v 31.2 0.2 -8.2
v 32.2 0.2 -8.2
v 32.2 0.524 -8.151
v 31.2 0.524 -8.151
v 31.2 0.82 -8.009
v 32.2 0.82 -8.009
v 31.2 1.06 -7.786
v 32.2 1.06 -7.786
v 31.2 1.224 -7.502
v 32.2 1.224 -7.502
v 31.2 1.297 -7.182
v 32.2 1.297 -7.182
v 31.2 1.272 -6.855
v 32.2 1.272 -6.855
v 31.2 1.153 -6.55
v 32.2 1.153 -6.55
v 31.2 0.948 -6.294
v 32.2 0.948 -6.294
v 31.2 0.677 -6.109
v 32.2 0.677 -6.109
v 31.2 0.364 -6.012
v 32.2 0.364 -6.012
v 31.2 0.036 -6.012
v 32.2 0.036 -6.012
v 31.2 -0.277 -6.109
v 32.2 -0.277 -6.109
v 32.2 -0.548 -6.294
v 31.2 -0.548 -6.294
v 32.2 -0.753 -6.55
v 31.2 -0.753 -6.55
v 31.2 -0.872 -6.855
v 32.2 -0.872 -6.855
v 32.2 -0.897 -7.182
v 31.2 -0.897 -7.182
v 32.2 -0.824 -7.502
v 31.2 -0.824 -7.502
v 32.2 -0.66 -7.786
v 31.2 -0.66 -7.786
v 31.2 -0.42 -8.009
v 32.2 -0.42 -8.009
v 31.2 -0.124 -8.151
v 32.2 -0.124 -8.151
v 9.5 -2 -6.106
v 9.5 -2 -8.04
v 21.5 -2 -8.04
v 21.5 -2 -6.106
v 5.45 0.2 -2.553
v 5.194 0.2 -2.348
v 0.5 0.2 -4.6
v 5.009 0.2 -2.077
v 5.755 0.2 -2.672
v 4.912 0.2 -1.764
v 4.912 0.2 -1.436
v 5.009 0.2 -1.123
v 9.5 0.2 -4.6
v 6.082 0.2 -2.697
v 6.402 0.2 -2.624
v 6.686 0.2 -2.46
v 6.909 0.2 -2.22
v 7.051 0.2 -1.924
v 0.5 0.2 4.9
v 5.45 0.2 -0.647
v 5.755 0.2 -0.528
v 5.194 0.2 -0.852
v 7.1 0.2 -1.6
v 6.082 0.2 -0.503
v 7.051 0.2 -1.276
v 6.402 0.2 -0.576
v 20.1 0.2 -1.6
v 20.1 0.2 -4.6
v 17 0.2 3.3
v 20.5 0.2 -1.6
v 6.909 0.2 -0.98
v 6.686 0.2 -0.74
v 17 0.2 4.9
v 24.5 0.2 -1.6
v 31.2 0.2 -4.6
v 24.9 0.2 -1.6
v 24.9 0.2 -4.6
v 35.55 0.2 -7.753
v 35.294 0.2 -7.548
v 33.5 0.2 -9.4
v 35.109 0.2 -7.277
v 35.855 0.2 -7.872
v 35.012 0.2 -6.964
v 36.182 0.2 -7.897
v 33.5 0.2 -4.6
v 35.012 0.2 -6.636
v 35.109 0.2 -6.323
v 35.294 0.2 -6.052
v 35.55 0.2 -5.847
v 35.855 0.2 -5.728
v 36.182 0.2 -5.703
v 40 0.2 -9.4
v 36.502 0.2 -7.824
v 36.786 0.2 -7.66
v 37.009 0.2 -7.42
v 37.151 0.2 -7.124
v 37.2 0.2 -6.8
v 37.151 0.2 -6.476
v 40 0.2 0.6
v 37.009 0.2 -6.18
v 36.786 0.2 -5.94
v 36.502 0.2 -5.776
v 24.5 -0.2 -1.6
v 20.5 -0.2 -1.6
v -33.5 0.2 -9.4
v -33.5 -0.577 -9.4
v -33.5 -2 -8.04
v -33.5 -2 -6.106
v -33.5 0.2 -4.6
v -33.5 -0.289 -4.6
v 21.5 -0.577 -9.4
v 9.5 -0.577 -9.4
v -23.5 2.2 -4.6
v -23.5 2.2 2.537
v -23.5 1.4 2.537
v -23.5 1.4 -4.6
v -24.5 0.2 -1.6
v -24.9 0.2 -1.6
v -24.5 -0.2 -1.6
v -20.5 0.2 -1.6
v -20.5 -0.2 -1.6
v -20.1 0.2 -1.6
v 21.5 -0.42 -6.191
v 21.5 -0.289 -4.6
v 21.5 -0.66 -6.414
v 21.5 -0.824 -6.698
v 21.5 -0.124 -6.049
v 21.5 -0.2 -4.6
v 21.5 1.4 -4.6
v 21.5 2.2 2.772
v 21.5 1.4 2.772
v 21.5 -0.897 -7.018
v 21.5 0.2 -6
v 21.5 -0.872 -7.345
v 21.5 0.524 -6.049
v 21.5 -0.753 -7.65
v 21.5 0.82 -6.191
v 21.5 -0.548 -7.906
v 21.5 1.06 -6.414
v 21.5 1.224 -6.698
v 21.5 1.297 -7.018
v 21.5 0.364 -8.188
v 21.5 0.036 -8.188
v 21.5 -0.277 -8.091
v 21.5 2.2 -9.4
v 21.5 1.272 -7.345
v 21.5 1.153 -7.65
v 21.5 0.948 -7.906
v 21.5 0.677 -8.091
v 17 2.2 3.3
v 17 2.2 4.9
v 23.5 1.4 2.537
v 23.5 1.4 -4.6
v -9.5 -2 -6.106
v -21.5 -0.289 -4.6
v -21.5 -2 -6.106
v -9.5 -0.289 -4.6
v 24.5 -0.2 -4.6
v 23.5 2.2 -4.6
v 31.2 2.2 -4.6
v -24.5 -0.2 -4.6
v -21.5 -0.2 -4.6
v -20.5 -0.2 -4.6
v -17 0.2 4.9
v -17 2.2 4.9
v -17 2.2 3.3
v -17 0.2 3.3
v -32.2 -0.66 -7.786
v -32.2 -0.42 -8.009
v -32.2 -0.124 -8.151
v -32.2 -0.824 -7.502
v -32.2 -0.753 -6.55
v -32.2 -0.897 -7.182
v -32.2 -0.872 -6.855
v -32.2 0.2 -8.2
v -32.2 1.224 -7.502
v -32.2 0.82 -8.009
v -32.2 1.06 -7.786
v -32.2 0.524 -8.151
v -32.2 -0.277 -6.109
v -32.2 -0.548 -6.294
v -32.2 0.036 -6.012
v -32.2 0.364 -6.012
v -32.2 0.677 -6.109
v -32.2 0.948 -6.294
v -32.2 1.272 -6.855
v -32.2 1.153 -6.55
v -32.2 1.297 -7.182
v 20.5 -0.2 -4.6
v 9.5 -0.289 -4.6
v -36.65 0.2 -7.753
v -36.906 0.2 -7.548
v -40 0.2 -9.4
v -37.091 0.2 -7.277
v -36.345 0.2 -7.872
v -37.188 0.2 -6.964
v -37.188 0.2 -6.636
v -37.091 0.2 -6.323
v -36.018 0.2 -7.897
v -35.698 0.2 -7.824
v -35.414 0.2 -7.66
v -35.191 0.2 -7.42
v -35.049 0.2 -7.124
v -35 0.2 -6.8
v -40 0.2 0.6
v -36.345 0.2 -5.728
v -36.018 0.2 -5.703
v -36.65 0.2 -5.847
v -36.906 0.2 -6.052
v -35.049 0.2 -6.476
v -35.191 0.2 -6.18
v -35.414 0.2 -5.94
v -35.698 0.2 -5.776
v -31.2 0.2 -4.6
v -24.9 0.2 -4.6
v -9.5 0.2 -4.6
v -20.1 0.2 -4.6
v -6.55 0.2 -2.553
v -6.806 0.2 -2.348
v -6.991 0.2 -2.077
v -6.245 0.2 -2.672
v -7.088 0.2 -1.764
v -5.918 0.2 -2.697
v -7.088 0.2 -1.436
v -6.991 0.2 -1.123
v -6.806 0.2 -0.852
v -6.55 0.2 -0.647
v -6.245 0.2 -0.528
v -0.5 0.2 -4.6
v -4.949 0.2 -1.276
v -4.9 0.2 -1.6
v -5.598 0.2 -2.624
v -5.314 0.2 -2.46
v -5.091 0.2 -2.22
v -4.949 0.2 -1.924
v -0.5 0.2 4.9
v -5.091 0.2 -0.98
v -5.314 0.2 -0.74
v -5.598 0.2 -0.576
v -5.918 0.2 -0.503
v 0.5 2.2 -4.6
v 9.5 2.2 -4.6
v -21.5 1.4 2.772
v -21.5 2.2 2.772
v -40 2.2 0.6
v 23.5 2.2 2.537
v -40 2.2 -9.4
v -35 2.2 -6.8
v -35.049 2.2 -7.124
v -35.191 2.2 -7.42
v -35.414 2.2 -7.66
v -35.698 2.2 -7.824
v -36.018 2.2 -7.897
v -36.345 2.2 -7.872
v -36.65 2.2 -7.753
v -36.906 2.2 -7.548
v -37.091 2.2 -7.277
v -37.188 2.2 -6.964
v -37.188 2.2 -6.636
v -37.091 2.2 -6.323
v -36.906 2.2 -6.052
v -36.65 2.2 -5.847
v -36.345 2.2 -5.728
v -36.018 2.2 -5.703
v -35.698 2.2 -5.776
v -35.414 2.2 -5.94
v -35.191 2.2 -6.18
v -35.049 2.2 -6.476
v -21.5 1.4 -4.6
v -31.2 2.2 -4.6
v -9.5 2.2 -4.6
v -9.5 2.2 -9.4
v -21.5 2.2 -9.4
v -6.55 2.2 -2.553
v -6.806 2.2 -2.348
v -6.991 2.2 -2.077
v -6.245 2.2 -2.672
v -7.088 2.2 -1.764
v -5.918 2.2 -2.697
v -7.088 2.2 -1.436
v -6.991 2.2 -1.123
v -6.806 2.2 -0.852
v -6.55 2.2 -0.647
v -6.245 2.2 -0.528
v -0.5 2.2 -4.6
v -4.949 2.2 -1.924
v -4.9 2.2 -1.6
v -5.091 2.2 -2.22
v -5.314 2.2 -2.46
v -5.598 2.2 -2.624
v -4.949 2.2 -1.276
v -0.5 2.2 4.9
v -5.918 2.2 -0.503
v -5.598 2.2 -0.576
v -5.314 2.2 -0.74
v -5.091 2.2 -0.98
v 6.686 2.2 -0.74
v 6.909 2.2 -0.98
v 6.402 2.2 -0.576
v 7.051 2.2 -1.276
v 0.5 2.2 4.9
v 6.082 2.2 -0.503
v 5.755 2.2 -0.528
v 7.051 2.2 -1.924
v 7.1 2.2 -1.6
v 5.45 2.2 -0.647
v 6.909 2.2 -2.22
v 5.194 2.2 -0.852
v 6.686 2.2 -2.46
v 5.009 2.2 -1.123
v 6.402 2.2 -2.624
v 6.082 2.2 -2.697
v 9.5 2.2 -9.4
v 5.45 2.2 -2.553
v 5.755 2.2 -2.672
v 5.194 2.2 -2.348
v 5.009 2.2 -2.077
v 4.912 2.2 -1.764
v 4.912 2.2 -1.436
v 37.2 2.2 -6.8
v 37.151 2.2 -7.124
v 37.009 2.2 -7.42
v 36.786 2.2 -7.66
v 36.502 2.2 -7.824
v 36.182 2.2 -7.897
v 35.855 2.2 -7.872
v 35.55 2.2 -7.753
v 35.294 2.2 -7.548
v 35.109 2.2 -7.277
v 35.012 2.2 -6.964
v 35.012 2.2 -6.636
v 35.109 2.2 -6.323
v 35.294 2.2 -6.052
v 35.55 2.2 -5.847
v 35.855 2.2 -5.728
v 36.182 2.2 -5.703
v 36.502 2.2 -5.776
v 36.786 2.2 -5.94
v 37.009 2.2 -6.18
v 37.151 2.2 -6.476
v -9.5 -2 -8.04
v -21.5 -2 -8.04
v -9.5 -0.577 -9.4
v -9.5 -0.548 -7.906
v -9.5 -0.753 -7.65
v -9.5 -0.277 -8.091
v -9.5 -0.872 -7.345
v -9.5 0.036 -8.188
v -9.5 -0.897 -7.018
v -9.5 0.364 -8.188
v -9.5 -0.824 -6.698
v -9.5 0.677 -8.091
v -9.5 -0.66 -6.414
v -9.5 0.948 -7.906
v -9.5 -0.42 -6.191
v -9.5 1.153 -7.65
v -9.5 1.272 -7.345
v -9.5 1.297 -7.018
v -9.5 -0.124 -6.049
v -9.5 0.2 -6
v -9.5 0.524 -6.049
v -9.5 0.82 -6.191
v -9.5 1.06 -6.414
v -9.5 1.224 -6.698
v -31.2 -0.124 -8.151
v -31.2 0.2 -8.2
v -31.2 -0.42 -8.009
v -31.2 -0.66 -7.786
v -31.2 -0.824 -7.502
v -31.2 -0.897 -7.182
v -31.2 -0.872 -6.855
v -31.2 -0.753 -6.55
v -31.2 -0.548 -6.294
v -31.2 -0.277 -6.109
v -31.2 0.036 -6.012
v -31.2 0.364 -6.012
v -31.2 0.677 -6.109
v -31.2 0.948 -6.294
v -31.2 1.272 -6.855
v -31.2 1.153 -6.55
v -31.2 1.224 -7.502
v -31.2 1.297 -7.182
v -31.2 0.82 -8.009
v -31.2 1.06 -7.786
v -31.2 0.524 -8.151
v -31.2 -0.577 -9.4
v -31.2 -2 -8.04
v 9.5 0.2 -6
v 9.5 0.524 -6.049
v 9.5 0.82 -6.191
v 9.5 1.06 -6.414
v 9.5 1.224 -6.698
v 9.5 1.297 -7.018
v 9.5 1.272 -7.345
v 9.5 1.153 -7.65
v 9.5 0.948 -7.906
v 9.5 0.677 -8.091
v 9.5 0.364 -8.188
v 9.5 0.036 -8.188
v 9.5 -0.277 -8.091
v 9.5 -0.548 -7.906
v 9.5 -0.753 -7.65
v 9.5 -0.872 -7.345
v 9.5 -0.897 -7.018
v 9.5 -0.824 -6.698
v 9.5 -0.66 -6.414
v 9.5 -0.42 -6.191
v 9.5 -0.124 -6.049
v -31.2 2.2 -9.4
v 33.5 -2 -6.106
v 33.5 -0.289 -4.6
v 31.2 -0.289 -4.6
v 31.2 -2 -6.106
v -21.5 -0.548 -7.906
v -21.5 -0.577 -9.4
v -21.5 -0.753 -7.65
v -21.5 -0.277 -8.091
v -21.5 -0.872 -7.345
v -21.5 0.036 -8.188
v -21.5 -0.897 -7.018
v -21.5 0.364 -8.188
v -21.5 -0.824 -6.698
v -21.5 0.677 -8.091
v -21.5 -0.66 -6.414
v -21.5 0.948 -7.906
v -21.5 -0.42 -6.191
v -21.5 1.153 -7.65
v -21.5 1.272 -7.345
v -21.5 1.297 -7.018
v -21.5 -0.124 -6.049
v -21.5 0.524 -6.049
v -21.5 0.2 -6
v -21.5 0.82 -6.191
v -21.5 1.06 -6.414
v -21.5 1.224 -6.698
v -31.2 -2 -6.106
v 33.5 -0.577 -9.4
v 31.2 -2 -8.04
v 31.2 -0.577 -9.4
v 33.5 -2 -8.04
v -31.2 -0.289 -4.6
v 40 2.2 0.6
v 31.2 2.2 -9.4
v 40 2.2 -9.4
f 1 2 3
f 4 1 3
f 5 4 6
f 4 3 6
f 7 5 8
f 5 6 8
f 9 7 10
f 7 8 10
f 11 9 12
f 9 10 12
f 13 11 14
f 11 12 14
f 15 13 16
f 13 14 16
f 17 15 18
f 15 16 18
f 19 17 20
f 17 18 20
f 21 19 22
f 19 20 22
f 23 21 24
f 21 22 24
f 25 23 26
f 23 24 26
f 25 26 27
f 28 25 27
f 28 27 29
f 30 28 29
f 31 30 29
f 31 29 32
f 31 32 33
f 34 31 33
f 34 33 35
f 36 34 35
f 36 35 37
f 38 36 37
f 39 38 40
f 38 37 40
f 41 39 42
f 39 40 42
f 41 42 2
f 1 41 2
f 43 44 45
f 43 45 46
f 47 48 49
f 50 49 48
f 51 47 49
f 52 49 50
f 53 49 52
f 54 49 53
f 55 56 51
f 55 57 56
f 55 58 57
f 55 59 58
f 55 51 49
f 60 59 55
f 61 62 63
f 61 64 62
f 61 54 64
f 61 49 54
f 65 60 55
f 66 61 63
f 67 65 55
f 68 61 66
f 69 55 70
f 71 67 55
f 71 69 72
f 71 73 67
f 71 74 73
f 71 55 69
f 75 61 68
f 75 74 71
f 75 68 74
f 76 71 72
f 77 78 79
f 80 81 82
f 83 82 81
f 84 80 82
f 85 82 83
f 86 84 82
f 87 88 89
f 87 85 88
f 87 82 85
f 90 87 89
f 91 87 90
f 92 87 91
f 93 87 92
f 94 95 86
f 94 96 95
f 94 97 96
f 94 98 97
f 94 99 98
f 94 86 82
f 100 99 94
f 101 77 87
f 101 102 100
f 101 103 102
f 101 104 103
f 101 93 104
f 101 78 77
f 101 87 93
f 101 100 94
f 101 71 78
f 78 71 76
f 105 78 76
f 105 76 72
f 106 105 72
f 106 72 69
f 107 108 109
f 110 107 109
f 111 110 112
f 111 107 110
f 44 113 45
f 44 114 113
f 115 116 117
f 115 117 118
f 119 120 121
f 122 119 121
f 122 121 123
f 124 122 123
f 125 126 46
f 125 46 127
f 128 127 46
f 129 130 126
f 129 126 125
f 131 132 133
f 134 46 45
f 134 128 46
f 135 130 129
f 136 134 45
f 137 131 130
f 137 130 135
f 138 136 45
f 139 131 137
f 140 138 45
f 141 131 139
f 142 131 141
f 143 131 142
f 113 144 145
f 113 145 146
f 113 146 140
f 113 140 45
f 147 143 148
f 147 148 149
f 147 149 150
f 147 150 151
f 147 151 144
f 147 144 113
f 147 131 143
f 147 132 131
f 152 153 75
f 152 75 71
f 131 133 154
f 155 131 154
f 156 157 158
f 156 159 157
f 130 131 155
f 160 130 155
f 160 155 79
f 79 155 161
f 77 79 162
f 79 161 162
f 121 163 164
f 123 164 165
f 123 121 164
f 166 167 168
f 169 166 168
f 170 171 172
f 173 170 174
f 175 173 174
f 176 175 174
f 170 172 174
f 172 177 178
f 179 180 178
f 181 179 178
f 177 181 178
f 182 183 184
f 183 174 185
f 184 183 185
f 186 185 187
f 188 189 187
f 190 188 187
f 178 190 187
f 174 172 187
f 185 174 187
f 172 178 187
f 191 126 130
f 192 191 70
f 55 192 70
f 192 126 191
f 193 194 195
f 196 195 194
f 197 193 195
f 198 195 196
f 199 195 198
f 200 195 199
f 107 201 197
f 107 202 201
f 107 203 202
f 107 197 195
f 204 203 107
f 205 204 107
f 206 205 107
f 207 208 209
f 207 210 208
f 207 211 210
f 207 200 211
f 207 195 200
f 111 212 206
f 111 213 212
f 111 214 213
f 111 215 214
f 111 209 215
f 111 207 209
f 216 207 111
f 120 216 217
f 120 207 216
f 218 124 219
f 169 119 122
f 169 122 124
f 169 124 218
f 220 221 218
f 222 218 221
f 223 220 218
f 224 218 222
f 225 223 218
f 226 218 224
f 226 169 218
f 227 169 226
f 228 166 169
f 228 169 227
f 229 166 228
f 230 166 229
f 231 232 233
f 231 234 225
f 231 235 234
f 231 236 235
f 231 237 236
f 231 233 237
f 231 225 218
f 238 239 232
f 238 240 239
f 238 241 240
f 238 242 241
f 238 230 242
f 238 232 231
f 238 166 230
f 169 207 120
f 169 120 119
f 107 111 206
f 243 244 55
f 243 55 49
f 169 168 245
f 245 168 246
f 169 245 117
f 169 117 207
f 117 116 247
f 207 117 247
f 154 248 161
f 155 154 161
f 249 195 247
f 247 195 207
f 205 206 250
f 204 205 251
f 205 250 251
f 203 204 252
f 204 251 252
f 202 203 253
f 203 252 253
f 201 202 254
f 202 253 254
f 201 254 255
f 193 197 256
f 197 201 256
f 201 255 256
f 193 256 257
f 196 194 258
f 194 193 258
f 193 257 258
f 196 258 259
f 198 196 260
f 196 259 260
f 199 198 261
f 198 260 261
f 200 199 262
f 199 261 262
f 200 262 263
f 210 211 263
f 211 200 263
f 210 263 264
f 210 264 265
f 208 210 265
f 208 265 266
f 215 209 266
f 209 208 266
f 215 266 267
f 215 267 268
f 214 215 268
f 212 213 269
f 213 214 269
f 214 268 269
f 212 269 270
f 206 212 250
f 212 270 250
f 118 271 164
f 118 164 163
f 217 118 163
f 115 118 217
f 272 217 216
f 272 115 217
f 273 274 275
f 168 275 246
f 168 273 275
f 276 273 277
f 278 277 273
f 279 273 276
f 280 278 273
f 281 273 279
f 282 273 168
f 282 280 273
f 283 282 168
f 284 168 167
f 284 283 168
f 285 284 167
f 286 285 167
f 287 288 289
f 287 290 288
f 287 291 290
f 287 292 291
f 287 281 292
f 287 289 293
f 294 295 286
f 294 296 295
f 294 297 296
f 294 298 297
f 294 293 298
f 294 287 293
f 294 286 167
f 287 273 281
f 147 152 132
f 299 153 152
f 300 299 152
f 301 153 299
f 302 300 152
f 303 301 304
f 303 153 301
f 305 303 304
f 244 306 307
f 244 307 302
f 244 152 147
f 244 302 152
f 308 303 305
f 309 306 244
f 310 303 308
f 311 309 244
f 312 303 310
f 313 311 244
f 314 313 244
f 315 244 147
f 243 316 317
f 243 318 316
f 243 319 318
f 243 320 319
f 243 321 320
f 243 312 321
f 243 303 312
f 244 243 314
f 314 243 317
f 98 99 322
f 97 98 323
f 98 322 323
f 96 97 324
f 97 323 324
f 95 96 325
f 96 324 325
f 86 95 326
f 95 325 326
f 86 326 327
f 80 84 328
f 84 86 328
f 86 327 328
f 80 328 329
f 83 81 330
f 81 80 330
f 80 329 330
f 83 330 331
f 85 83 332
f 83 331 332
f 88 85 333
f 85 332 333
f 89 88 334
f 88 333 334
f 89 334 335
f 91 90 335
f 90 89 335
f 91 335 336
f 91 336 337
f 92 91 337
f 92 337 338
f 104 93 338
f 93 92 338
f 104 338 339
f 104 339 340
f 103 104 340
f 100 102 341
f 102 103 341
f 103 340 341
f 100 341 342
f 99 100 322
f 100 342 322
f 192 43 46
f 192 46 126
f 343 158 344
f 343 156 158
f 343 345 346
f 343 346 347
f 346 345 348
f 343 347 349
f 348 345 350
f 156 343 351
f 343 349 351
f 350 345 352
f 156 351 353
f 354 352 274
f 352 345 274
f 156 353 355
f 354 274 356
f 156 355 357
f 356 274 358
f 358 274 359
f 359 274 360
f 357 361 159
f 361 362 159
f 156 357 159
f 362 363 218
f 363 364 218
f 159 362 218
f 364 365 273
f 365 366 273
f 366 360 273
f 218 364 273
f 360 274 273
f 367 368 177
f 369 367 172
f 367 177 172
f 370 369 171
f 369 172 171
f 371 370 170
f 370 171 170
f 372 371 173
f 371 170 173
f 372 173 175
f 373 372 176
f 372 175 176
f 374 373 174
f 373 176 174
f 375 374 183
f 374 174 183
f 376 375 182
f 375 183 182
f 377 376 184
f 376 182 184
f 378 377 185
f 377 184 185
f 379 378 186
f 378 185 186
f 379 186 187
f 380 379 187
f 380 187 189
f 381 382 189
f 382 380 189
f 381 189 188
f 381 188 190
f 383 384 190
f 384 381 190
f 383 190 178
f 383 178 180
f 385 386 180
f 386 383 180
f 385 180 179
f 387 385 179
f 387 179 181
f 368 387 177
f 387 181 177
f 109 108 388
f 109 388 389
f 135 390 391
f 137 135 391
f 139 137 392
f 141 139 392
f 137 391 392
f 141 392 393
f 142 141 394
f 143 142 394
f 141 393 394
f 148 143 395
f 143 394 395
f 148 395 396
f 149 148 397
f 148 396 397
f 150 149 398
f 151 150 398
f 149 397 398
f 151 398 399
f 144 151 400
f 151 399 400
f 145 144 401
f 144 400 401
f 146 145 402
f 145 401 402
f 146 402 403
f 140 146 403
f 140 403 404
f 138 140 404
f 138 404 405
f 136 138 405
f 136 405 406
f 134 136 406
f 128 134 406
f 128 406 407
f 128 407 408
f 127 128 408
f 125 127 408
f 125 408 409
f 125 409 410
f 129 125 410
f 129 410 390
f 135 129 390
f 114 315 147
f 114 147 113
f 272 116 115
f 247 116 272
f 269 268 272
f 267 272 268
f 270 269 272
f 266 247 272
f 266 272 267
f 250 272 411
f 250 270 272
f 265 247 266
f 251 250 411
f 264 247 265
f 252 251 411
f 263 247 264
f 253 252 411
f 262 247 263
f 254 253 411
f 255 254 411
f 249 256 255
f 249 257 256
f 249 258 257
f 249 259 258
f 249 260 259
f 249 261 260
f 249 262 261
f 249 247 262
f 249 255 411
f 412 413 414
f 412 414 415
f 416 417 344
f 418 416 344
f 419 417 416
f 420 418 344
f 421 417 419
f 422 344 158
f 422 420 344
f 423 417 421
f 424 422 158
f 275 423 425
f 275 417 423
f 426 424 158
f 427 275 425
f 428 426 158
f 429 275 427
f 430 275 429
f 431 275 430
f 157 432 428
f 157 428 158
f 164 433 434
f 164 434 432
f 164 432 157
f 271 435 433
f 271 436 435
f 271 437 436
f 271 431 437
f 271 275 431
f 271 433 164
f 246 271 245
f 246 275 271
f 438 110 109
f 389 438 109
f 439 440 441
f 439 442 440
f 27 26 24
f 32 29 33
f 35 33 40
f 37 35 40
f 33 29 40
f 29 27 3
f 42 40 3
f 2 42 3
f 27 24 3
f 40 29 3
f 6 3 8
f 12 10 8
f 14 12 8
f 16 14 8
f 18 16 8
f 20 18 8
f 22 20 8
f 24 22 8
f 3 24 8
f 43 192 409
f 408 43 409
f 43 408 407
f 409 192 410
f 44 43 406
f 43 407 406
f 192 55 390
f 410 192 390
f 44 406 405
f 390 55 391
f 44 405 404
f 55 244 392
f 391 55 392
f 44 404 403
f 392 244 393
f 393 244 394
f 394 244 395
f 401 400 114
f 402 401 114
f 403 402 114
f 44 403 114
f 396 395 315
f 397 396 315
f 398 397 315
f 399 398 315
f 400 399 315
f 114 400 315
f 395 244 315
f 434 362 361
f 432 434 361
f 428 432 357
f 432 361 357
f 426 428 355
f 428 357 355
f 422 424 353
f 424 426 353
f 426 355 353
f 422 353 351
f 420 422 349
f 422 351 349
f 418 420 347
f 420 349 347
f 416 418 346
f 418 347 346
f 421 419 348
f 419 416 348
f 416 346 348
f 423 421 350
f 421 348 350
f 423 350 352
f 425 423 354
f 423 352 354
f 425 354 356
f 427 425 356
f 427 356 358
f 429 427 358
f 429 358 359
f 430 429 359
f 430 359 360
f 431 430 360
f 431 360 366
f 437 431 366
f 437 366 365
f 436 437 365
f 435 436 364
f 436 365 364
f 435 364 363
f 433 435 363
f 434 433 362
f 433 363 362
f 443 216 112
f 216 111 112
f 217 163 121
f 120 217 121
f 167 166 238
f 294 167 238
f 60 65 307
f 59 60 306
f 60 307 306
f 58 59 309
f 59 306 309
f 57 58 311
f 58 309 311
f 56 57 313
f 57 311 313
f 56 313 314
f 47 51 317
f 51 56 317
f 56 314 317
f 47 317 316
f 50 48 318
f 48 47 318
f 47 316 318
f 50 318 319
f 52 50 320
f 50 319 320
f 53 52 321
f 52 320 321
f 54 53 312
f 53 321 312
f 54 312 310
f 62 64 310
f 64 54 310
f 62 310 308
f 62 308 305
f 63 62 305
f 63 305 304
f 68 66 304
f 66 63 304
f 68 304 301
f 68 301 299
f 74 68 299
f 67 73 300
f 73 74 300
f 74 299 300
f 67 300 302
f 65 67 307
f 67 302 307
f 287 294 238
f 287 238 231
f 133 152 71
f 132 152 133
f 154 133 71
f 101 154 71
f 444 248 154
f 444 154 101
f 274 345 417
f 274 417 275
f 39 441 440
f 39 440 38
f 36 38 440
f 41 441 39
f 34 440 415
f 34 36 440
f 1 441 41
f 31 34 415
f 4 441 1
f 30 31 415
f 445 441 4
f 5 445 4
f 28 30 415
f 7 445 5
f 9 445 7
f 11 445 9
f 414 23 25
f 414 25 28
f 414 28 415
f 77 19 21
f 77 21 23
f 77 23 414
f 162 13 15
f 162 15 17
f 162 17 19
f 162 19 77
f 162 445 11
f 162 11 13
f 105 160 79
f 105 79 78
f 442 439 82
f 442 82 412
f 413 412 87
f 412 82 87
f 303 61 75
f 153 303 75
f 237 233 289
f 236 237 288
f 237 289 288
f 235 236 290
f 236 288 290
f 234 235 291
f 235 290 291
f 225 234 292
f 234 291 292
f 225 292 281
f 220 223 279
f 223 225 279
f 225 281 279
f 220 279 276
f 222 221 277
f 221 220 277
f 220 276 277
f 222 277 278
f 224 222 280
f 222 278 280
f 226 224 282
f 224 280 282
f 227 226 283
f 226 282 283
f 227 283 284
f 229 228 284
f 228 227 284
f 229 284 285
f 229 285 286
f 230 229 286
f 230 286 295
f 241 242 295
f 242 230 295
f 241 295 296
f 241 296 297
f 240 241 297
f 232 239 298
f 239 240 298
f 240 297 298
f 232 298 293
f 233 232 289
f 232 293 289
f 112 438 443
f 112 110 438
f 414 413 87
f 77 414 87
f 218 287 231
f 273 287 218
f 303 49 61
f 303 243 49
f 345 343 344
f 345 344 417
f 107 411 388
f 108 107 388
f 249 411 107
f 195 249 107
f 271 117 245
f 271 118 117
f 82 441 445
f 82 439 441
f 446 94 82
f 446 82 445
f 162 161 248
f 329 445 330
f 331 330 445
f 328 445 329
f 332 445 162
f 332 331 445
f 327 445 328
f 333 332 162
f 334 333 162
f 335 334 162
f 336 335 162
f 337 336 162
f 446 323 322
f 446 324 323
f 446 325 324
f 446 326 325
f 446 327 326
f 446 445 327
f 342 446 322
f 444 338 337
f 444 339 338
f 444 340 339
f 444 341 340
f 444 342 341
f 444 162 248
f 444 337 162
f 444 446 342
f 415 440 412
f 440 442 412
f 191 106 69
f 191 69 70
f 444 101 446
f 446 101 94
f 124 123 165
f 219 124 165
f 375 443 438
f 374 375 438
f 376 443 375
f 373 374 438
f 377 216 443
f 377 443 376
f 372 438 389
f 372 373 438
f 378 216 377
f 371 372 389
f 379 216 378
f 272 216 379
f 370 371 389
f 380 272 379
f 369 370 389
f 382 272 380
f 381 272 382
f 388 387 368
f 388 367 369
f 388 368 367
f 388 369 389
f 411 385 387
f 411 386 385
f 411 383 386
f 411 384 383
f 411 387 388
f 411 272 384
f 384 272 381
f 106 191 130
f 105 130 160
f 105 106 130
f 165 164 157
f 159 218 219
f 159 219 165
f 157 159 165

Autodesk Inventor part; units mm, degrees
sketch "Boceto1" plane through (0, 0, 0) normal (0, 1, 0) x (-1, 0, 0)
  line L0 (-40, -4.9) -> (40, -4.9)
  line L1 (40, -4.9) -> (40, 4.9)
  line L2 (40, 4.9) -> (-40, 4.9)
  line L3 (-40, 4.9) -> (-40, -4.9)
  line L4 (-40, -4.9) -> (40, 4.9) construction
  line L5 (40, -4.9) -> (-40, 4.9) construction
  point P0 (0, 0)
  dimension "d0" = 9.8
  dimension "d1" = 80
extrude "Extrusión1" add sketch "Boceto1" along normal blind 2.2
sketch "Boceto4" plane through (0, 2.2, 0) normal (0, 1, 0) x (1, 0, 0)
  line L0 (40, 4.9) -> (-40, 4.9) projected
  line L1 (-40, -4.9) -> (40, -4.9) projected
  line L2 (23.5, 4.9) -> (21.5, 4.9)
  line L3 (21.5, 4.9) -> (21.5, -4.9)
  line L4 (21.5, -4.9) -> (23.5, -4.9)
  line L5 (23.5, -4.9) -> (23.5, 4.9)
  line L6 (40, -4.9) -> (40, 4.9) projected
  line L7 (0, 0) -> (0, 8.5747)
  line L8 (-23.5, 4.9) -> (-21.5, 4.9)
  line L9 (-21.5, 4.9) -> (-21.5, -4.9)
  line L10 (-21.5, -4.9) -> (-23.5, -4.9)
  line L11 (-23.5, -4.9) -> (-23.5, 4.9)
  point P0 (19.5, 4.9)
  dimension "d15" = 2
  dimension "d16" = 16.5
extrude "Extrusión4" cut sketch "Boceto4" against normal blind 0.8 contours L5 L1 L3 L0 | L9 L1 L11 L0
sketch "Boceto7" plane through (-40, 0, -4.9) normal (0, 0, -1) x (-1, 0, 0)
  line L0 (-80, 0) -> (0, 0) projected
  line L1 (-63.5, 2.2) -> (-80, 2.2) projected
  line L2 (-80, 0) -> (-73.5, 0)
  line L3 (-73.5, 0) -> (-73.5, 2.2)
  line L4 (-73.5, 2.2) -> (-80, 2.2)
  line L5 (-80, 2.2) -> (-80, 0)
  line L6 (-80, 0) -> (0, 0) projected
  line L7 (0, 2.2) -> (-16.5, 2.2) projected
  line L8 (0, 0) -> (-6.5, 0)
  line L9 (-6.5, 0) -> (-6.5, 2.2)
  line L10 (-6.5, 2.2) -> (0, 2.2)
  line L11 (0, 2.2) -> (0, 0)
  point P0 (-40, 0)
  point P1 (-59.5, 0)
  point P2 (-20.5, 0)
  dimension "d43" = 6.5
  dimension "d44" = 6.5
extrude "Extrusión7" add sketch "Boceto7" along normal blind 4.5
ref_plane "Plano de trabajo7" through (9.5, 0, -4.9) normal (0, 0, -1) x (-1, 0, 0)
sketch "Boceto8" plane through (9.5, 0, -4.9) normal (0, 0, -1) x (-1, 0, 0)
  line L0 (0, 2.2) -> (19, 2.2) projected
  line L1 (-24, 0) -> (43, 0) projected
  line L2 (-12, 2.2) -> (31, 2.2) projected
  line L3 (43, 0) -> (43, 2.2) projected
  line L4 (33, 2.2) -> (43, 2.2) projected
  line L5 (33, 2.2) -> (33, 1.4) projected
  line L6 (-12, 1.4) -> (-14, 1.4) projected
  line L7 (-24, 2.2) -> (-24, 0) projected
  line L8 (33, 1.4) -> (31, 1.4) projected
  line L9 (-14, 1.4) -> (-14, 2.2) projected
  line L10 (-24, 2.2) -> (-14, 2.2) projected
  line L11 (31, 1.4) -> (31, 2.2) projected
  line L12 (-12, 2.2) -> (-12, 1.4) projected
  point P0 (9.5, 0)
extrude "Extrusión8" cut sketch "Boceto8" against normal blind 0.3
sketch "Boceto11" plane through (0, 2.2, 0) normal (0, 1, 0) x (1, 0, 0)
  circle A0 centre (-36.1, 6.8) radius 1.1
  line L0 (-40, 9.4) -> (-33.5, 9.4) projected
  line L1 (-40, -4.9) -> (-40, 9.4) projected
  line L2 (0, 4.6) -> (0, 9.4)
  circle A1 centre (36.1, 6.8) radius 1.1
  point P0 (0, 0)
  dimension "d45" = 2.2
  dimension "d46" = 2.6
  dimension "d47" = 3.9
extrude "Extrusión11" cut sketch "Boceto11" against normal through all
sketch "Boceto14" plane through (0, 2.2, 0) normal (0, 1, 0) x (1, 0, 0)
  line L0 (-40, -4.9) -> (-40, 9.4) projected
  line L1 (-40, -4.9) -> (-40, -0.6)
  line L2 (-40, 9.4) -> (-33.5, 9.4) projected
  line L3 (0, 4.6) -> (0, 10.3532)
  line L4 (-40, -4.9) -> (-17, -4.9)
  line L5 (-17, -4.9) -> (-17, -3.3)
  line L6 (-17, -3.3) -> (-40, -0.6)
  line L7 (40, -4.9) -> (40, -0.6)
  line L8 (40, -4.9) -> (17, -4.9)
  line L9 (17, -4.9) -> (17, -3.3)
  line L10 (17, -3.3) -> (40, -0.6)
  point P0 (0, 0)
  point P1 (40, -4.9)
  dimension "d59" = 10
  dimension "d65" = 23
  dimension "d67" = 1.6
extrude "Extrusión14" cut sketch "Boceto14" against normal through all
ref_plane "Plano de trabajo5" through (0, 2.2, 0) normal (0, 1, 0) x (1, 0, 0)
sketch "Boceto15" plane through (0, 2.2, 0) normal (0, 1, 0) x (1, 0, 0)
  line L0 (0.5, -5.659) -> (-0.5, -5.659)
  line L1 (-0.5, -5.659) -> (-0.5, 5.659)
  line L2 (-0.5, 5.659) -> (0.5, 5.659)
  line L3 (0.5, 5.659) -> (0.5, -5.659)
  line L4 (0.5, -5.659) -> (-0.5, 5.659) construction
  line L5 (-0.5, -5.659) -> (0.5, 5.659) construction
  dimension "d69" = 1
extrude "Extrusión15" cut sketch "Boceto15" against normal through all
sketch "Boceto16" plane through (0, 2.2, 0) normal (0, 1, 0) x (1, 0, 0)
  circle A0 centre (-6, 1.6) radius 1.1
  line L0 (0, 0) -> (0, 8.3303)
  circle A1 centre (6, 1.6) radius 1.1
  line L1 (-0.5, 4.6) -> (-21.5, 4.6) projected
  line L2 (-0.5, -4.9) -> (-0.5, 4.6) projected
  dimension "d78" = 2.2
  dimension "d99" = 3
  dimension "d100" = 5.5
extrude "Extrusión16" cut sketch "Boceto16" against normal through all
sketch "Boceto17" plane through (0, 0, 0) normal (0, -1, 0) x (1, 0, 0)
  circle A0 centre (-6, -1.6) radius 1.1 projected
  line L0 (-17, 4.9) -> (-0.5, 4.9) projected
  line L1 (-17, 4.9) -> (-17, 3.3) projected
  line L2 (-17, 3.3) -> (-40, 0.6) projected
  line L3 (-40, 0.6) -> (-40, -9.4) projected
  line L4 (-33.5, -9.4) -> (-40, -9.4) projected
  circle A1 centre (-36.1, -6.8) radius 1.1 projected
  circle A2 centre (6, -1.6) radius 1.1 projected
  circle A3 centre (36.1, -6.8) radius 1.1 projected
  line L5 (40, -9.4) -> (33.5, -9.4) projected
  line L6 (40, 0.6) -> (40, -9.4) projected
  line L7 (40, 0.6) -> (17, 3.3) projected
  line L8 (17, 3.3) -> (17, 4.9) projected
  line L9 (0.5, 4.9) -> (17, 4.9) projected
  line L10 (-17, 3.3) -> (-40, 0.6) projected
  line L11 (-40, 0.6) -> (-40, -9.4) projected
  line L12 (-33.5, -9.4) -> (-40, -9.4) projected
  line L13 (-17, 4.9) -> (-17, 3.3) projected
  line L14 (40, -9.4) -> (33.5, -9.4) projected
  line L15 (40, 0.6) -> (40, -9.4) projected
  line L16 (40, 0.6) -> (17, 3.3) projected
  line L17 (17, 3.3) -> (17, 4.9) projected
  line L18 (-33.5, -9.4) -> (-33.5, -4.6) projected
  line L19 (33.5, -4.6) -> (33.5, -9.4) projected
  line L20 (-33.5, -9.4) -> (-33.5, -4.6) projected
  line L21 (33.5, -4.6) -> (33.5, -9.4) projected
  line L22 (0.5, 4.9) -> (0.5, -4.6) projected
  line L23 (-0.5, -4.6) -> (-0.5, 4.9) projected
  line L24 (-17, 4.9) -> (-0.5, 4.9) projected
  line L25 (0.5, 4.9) -> (0.5, -4.6) projected
  line L26 (0.5, 4.9) -> (17, 4.9) projected
  line L27 (-0.5, -4.6) -> (-0.5, 4.9) projected
  line L28 (0.5, -4.6) -> (33.5, -4.6) projected
  line L29 (-33.5, -4.6) -> (-0.5, -4.6) projected
  line L30 (0.5, -4.6) -> (33.5, -4.6) projected
  line L31 (-33.5, -4.6) -> (-0.5, -4.6) projected
  point P0 (0, 0)
extrude "Extrusión17" cut sketch "Boceto17" against normal blind 0.2
sketch "Boceto18" plane through (-33.5, 2.2, -4.9) normal (1, 0, 0) x (0, 0, -1)
  circle A0 centre (2.2, -2) radius 1.1
  line L0 (4.5, 0) -> (4.5, -2) projected
  line L1 (-0.3, 0) -> (4.5, 0) projected
  line L2 (-0.3, 0) -> (-0.3, -2) projected
  line L3 (4.5, 0) -> (-0.3, 0)
  line L4 (-0.3, 0) -> (-0.3, -2.4893)
  line L5 (1.2055, -4.2) -> (3.14, -4.2)
  line L6 (4.5, -2.7769) -> (4.5, 0)
  line L7 (4.5, -2.7769) -> (3.14, -4.2)
  line L8 (1.2055, -4.2) -> (-0.3, -2.4893)
  dimension "d89" = 2.2
  dimension "d90" = 1.1
  dimension "d91" = 2
extrude "Extrusión18" add sketch "Boceto18" along normal blind 2.3
sketch "Boceto20" plane through (-33.5, 2.2, -4.9) normal (-1, 0, 0) x (0, 0, 1)
  circle A0 centre (-2.2, -2) radius 1.1 projected
  point P0 (4.9, -2.2)
extrude "Extrusión19" add sketch "Boceto20" against normal blind 1.3
mirror "Simetría1" about plane through (0, 0, 0) normal (1, 0, 0) of "Extrusión19", "Extrusión18"
ref_plane "Plano de trabajo8" through (-9.5, 2.2, -9.4) normal (-1, 0, 0) x (0, 0, 1)
sketch "Boceto21" plane through (-9.5, 2.2, -9.4) normal (-1, 0, 0) x (0, 0, 1)
  circle A0 centre (2.3, -2) radius 1.1 projected
  line L0 (0, 0) -> (4.8, 0) projected
  line L1 (0, -2.7769) -> (0, 0) projected
  line L2 (1.36, -4.2) -> (0, -2.7769) projected
  line L3 (3.2945, -4.2) -> (1.36, -4.2) projected
  line L4 (4.8, -2.4893) -> (3.2945, -4.2) projected
  line L5 (4.8, -2) -> (4.8, -2.4893) projected
  line L6 (4.8, 0) -> (4.8, -2) projected
  point P0 (9.4, -2.2)
extrude "Extrusión20" add sketch "Boceto21" along normal blind 12
mirror "Simetría2" about plane through (0, 0, 0) normal (1, 0, 0) of "Extrusión20"
sketch "Boceto23" plane through (0, 0.2, 0) normal (0, -1, 0) x (1, 0, 0)
  line L0 (-23.5, 2.537) -> (-21.5, 2.7717) projected
  line L1 (-21.5, -4.6) -> (-21.5, 2.7717) projected
  line L2 (-21.5, -4.6) -> (-23.5, -4.6) projected
  line L3 (-23.5, 2.537) -> (-23.5, -4.6) projected
  line L4 (-23.5, -4.6) -> (-31.2, -4.6) projected
  line L5 (-24.5, -4.6) -> (-24.5, -1.6)
  line L6 (-24.5, -1.6) -> (-20.5, -1.6)
  line L7 (-20.5, -1.6) -> (-20.5, -4.6)
  line L8 (-20.5, -4.6) -> (-24.5, -4.6)
  line L9 (0, 0) -> (0, 8.701)
  line L10 (21.5, -4.6) -> (23.5, -4.6)
  line L11 (24.5, -4.6) -> (24.5, -1.6)
  line L12 (24.5, -1.6) -> (20.5, -1.6)
  line L13 (20.5, -1.6) -> (20.5, -4.6)
  line L14 (20.5, -4.6) -> (24.5, -4.6)
  dimension "d101" = 1
  dimension "d102" = 1
  dimension "d103" = 3
extrude "Extrusión22" add sketch "Boceto23" along normal blind 0.4 contours L6 L1 L2 L3 | L3 L4 L5 L6 | L6 L7 L8 L1 | L14 L13 L12 L11 L10
chamfer "Chaflán3" distance 0.4 angle 45 1 edges at (20.5, 0.2, -3.1)
chamfer "Chaflán4" distance 0.4 angle 45 1 edges at (24.5, 0.2, -3.1)
chamfer "Chaflán5" distance 0.4 angle 45 2 edges at (-20.5, 0.2, -3.1) (-24.5, 0.2, -3.1)
properties part number "SoportePlaca_SPEL_Rev.3" material "WindForm xt 2.0"
